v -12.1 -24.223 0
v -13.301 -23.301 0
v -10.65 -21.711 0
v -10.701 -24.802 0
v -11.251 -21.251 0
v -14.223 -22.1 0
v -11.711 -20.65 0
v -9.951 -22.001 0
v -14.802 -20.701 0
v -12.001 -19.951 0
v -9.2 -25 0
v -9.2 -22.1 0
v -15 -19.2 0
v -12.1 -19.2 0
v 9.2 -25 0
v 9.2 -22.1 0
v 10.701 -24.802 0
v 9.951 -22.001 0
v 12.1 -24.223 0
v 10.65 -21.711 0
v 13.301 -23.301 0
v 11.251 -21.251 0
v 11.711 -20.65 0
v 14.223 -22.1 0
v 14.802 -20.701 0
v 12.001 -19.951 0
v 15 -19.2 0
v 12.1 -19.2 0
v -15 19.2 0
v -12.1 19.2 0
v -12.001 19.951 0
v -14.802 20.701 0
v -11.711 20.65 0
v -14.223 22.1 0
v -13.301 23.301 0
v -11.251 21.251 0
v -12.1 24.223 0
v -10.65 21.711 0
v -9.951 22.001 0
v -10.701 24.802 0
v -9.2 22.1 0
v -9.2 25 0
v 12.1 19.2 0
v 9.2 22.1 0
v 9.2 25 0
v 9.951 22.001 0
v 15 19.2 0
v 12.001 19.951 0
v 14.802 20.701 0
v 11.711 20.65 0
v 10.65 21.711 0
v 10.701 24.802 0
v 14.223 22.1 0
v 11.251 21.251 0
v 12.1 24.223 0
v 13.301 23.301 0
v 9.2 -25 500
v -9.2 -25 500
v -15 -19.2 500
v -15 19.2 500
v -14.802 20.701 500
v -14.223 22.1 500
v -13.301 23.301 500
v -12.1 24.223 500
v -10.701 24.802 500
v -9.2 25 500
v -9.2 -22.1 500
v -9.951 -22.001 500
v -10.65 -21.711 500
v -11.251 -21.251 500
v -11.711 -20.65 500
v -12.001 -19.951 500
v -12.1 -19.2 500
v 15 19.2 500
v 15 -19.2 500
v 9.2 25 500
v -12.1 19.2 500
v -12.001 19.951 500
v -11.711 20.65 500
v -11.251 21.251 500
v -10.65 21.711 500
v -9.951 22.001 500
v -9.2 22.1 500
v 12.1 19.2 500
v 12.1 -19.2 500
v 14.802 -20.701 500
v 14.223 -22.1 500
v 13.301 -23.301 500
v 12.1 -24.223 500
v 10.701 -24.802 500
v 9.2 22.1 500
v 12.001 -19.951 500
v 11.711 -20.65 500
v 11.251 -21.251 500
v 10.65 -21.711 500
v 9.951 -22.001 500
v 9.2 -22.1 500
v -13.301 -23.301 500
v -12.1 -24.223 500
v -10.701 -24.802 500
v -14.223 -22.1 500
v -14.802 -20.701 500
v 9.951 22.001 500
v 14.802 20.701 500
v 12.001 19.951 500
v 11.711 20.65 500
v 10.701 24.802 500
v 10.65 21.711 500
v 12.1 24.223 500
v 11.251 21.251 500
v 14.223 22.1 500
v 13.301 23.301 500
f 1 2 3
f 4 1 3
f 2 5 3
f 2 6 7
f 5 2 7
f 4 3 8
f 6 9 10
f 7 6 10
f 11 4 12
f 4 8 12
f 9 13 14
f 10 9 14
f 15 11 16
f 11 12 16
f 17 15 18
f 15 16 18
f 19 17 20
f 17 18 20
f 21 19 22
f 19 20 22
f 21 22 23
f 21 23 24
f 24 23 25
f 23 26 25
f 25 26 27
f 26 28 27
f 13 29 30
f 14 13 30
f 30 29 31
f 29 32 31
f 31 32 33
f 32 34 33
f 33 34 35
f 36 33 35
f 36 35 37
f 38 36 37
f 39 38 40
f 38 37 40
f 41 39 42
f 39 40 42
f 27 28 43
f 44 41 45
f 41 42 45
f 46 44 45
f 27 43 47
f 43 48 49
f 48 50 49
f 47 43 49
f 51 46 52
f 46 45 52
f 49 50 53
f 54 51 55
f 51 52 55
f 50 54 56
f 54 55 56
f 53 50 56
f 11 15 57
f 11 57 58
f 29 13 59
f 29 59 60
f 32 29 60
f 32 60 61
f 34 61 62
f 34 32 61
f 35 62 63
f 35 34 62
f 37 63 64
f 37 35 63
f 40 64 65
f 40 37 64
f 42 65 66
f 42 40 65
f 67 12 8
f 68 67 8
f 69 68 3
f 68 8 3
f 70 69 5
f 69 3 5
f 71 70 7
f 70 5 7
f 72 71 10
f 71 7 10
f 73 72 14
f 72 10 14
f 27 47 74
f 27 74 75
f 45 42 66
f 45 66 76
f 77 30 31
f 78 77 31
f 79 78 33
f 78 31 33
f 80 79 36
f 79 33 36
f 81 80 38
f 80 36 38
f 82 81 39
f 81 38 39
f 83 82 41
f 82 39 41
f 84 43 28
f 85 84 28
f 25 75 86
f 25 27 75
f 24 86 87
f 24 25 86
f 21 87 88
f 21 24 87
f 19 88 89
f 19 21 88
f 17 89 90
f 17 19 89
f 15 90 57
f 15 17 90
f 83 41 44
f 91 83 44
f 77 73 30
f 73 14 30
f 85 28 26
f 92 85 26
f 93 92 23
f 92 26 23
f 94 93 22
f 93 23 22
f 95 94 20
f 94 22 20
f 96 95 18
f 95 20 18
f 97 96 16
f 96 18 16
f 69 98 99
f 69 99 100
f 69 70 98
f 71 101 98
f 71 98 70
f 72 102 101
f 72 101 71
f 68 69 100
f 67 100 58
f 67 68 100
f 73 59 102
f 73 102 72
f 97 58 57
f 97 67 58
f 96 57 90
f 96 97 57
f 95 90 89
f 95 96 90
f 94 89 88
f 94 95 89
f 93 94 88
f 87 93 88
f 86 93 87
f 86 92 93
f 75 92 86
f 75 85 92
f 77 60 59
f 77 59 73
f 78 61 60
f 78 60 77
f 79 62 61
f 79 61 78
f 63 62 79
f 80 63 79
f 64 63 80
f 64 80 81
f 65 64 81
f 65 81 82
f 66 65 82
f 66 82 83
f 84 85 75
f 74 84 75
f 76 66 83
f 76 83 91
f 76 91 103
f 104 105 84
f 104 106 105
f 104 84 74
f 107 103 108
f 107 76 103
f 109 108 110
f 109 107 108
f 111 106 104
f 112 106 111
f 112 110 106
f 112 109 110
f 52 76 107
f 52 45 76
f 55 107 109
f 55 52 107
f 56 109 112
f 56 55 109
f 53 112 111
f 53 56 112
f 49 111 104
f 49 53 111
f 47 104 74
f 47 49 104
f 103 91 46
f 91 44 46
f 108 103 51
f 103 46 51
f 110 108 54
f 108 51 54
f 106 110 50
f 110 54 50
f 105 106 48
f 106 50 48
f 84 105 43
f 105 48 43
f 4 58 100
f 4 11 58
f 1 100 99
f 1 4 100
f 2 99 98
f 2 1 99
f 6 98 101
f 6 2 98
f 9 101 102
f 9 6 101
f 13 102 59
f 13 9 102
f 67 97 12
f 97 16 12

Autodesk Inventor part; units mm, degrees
ref_plane "YZ Plane" through (0, 0, 0) normal (1, 0, 0) x (0, 1, 0)
ref_plane "Start plane" through (0, 0, 0) normal (0, 0, 1) x (1, 0, 0)
ref_plane "End plane" through (0, 0, 500) normal (0, 0, 1) x (1, 0, 0)
sketch "Sketch" plane through (0, 0, 0) normal (0, 0, 1) x (1, 0, 0)
  line L0 (-9.2, 25) -> (9.2, 25)
  line L1 (15, 19.2) -> (15, -19.2)
  line L2 (9.2, -25) -> (-9.2, -25)
  line L3 (-15, -19.2) -> (-15, 19.2)
  arc A0 (-9.2, 25) -> (-15, 19.2) centre (-9.2, 19.2) ccw
  arc A1 (15, 19.2) -> (9.2, 25) centre (9.2, 19.2) ccw
  arc A2 (9.2, -25) -> (15, -19.2) centre (9.2, -19.2) ccw
  arc A3 (-15, -19.2) -> (-9.2, -25) centre (-9.2, -19.2) ccw
  line L4 (-22.6817, 0) -> (22.6817, 0) construction
  line L5 (0, -36.6817) -> (0, 36.6817) construction
  arc A4 (-9.2, 22.1) -> (-12.1, 19.2) centre (-9.2, 19.2) ccw
  line L6 (-9.2, 22.1) -> (9.2, 22.1)
  arc A5 (12.1, 19.2) -> (9.2, 22.1) centre (9.2, 19.2) ccw
  line L7 (12.1, 19.2) -> (12.1, -19.2)
  arc A6 (9.2, -22.1) -> (12.1, -19.2) centre (9.2, -19.2) ccw
  line L8 (9.2, -22.1) -> (-9.2, -22.1)
  arc A7 (-12.1, -19.2) -> (-9.2, -22.1) centre (-9.2, -19.2) ccw
  line L9 (-12.1, -19.2) -> (-12.1, 19.2)
  point P0 (-15, 25)
  point P1 (15, -25)
  point P2 (15, 25)
  dimension "b" = 30
  dimension "ParH" = 50
  dimension "msp_r" = 5.8
  dimension "d8" = 15
  dimension "d9" = 25
  dimension "d10" = 2.9
extrude "Body" add sketch "Sketch" along normal up to surface (500 mm away) from surface at 0
sketch "Sketch2" plane through (0, 0, 0) normal (0, 0, 1) x (1, 0, 0)
  line L0 (0, 0) -> (10, 0)
ref_plane "Work Plane3" through (0, 0, 0) normal (0, -1, 0) x (1, 0, 0)
sketch "Sketch3" plane through (0, 0, 0) normal (0, -1, 0) x (1, 0, 0)
  line L0 (-2, 0) -> (12, 0)
  line L1 (-2, 500) -> (12, 500)
  dimension "d14" = 500
equation "\"msp_r\" = 2 * ParT"
equation "\"d8\" = 0.5 * b"
equation "\"d9\" = 0.5 * ParH"
equation "\"d10\" = ParT"
equation "\"G_OFFSET_START\" = 0"
equation "\"G_OFFSET_END\" = 0"
equation "\"G_L\" = d14"
equation "\"ParT\" = 2.9"
properties part number "DIN 59 410 - 50x30x2.9-500" material "Steel, Mild, Welded"
